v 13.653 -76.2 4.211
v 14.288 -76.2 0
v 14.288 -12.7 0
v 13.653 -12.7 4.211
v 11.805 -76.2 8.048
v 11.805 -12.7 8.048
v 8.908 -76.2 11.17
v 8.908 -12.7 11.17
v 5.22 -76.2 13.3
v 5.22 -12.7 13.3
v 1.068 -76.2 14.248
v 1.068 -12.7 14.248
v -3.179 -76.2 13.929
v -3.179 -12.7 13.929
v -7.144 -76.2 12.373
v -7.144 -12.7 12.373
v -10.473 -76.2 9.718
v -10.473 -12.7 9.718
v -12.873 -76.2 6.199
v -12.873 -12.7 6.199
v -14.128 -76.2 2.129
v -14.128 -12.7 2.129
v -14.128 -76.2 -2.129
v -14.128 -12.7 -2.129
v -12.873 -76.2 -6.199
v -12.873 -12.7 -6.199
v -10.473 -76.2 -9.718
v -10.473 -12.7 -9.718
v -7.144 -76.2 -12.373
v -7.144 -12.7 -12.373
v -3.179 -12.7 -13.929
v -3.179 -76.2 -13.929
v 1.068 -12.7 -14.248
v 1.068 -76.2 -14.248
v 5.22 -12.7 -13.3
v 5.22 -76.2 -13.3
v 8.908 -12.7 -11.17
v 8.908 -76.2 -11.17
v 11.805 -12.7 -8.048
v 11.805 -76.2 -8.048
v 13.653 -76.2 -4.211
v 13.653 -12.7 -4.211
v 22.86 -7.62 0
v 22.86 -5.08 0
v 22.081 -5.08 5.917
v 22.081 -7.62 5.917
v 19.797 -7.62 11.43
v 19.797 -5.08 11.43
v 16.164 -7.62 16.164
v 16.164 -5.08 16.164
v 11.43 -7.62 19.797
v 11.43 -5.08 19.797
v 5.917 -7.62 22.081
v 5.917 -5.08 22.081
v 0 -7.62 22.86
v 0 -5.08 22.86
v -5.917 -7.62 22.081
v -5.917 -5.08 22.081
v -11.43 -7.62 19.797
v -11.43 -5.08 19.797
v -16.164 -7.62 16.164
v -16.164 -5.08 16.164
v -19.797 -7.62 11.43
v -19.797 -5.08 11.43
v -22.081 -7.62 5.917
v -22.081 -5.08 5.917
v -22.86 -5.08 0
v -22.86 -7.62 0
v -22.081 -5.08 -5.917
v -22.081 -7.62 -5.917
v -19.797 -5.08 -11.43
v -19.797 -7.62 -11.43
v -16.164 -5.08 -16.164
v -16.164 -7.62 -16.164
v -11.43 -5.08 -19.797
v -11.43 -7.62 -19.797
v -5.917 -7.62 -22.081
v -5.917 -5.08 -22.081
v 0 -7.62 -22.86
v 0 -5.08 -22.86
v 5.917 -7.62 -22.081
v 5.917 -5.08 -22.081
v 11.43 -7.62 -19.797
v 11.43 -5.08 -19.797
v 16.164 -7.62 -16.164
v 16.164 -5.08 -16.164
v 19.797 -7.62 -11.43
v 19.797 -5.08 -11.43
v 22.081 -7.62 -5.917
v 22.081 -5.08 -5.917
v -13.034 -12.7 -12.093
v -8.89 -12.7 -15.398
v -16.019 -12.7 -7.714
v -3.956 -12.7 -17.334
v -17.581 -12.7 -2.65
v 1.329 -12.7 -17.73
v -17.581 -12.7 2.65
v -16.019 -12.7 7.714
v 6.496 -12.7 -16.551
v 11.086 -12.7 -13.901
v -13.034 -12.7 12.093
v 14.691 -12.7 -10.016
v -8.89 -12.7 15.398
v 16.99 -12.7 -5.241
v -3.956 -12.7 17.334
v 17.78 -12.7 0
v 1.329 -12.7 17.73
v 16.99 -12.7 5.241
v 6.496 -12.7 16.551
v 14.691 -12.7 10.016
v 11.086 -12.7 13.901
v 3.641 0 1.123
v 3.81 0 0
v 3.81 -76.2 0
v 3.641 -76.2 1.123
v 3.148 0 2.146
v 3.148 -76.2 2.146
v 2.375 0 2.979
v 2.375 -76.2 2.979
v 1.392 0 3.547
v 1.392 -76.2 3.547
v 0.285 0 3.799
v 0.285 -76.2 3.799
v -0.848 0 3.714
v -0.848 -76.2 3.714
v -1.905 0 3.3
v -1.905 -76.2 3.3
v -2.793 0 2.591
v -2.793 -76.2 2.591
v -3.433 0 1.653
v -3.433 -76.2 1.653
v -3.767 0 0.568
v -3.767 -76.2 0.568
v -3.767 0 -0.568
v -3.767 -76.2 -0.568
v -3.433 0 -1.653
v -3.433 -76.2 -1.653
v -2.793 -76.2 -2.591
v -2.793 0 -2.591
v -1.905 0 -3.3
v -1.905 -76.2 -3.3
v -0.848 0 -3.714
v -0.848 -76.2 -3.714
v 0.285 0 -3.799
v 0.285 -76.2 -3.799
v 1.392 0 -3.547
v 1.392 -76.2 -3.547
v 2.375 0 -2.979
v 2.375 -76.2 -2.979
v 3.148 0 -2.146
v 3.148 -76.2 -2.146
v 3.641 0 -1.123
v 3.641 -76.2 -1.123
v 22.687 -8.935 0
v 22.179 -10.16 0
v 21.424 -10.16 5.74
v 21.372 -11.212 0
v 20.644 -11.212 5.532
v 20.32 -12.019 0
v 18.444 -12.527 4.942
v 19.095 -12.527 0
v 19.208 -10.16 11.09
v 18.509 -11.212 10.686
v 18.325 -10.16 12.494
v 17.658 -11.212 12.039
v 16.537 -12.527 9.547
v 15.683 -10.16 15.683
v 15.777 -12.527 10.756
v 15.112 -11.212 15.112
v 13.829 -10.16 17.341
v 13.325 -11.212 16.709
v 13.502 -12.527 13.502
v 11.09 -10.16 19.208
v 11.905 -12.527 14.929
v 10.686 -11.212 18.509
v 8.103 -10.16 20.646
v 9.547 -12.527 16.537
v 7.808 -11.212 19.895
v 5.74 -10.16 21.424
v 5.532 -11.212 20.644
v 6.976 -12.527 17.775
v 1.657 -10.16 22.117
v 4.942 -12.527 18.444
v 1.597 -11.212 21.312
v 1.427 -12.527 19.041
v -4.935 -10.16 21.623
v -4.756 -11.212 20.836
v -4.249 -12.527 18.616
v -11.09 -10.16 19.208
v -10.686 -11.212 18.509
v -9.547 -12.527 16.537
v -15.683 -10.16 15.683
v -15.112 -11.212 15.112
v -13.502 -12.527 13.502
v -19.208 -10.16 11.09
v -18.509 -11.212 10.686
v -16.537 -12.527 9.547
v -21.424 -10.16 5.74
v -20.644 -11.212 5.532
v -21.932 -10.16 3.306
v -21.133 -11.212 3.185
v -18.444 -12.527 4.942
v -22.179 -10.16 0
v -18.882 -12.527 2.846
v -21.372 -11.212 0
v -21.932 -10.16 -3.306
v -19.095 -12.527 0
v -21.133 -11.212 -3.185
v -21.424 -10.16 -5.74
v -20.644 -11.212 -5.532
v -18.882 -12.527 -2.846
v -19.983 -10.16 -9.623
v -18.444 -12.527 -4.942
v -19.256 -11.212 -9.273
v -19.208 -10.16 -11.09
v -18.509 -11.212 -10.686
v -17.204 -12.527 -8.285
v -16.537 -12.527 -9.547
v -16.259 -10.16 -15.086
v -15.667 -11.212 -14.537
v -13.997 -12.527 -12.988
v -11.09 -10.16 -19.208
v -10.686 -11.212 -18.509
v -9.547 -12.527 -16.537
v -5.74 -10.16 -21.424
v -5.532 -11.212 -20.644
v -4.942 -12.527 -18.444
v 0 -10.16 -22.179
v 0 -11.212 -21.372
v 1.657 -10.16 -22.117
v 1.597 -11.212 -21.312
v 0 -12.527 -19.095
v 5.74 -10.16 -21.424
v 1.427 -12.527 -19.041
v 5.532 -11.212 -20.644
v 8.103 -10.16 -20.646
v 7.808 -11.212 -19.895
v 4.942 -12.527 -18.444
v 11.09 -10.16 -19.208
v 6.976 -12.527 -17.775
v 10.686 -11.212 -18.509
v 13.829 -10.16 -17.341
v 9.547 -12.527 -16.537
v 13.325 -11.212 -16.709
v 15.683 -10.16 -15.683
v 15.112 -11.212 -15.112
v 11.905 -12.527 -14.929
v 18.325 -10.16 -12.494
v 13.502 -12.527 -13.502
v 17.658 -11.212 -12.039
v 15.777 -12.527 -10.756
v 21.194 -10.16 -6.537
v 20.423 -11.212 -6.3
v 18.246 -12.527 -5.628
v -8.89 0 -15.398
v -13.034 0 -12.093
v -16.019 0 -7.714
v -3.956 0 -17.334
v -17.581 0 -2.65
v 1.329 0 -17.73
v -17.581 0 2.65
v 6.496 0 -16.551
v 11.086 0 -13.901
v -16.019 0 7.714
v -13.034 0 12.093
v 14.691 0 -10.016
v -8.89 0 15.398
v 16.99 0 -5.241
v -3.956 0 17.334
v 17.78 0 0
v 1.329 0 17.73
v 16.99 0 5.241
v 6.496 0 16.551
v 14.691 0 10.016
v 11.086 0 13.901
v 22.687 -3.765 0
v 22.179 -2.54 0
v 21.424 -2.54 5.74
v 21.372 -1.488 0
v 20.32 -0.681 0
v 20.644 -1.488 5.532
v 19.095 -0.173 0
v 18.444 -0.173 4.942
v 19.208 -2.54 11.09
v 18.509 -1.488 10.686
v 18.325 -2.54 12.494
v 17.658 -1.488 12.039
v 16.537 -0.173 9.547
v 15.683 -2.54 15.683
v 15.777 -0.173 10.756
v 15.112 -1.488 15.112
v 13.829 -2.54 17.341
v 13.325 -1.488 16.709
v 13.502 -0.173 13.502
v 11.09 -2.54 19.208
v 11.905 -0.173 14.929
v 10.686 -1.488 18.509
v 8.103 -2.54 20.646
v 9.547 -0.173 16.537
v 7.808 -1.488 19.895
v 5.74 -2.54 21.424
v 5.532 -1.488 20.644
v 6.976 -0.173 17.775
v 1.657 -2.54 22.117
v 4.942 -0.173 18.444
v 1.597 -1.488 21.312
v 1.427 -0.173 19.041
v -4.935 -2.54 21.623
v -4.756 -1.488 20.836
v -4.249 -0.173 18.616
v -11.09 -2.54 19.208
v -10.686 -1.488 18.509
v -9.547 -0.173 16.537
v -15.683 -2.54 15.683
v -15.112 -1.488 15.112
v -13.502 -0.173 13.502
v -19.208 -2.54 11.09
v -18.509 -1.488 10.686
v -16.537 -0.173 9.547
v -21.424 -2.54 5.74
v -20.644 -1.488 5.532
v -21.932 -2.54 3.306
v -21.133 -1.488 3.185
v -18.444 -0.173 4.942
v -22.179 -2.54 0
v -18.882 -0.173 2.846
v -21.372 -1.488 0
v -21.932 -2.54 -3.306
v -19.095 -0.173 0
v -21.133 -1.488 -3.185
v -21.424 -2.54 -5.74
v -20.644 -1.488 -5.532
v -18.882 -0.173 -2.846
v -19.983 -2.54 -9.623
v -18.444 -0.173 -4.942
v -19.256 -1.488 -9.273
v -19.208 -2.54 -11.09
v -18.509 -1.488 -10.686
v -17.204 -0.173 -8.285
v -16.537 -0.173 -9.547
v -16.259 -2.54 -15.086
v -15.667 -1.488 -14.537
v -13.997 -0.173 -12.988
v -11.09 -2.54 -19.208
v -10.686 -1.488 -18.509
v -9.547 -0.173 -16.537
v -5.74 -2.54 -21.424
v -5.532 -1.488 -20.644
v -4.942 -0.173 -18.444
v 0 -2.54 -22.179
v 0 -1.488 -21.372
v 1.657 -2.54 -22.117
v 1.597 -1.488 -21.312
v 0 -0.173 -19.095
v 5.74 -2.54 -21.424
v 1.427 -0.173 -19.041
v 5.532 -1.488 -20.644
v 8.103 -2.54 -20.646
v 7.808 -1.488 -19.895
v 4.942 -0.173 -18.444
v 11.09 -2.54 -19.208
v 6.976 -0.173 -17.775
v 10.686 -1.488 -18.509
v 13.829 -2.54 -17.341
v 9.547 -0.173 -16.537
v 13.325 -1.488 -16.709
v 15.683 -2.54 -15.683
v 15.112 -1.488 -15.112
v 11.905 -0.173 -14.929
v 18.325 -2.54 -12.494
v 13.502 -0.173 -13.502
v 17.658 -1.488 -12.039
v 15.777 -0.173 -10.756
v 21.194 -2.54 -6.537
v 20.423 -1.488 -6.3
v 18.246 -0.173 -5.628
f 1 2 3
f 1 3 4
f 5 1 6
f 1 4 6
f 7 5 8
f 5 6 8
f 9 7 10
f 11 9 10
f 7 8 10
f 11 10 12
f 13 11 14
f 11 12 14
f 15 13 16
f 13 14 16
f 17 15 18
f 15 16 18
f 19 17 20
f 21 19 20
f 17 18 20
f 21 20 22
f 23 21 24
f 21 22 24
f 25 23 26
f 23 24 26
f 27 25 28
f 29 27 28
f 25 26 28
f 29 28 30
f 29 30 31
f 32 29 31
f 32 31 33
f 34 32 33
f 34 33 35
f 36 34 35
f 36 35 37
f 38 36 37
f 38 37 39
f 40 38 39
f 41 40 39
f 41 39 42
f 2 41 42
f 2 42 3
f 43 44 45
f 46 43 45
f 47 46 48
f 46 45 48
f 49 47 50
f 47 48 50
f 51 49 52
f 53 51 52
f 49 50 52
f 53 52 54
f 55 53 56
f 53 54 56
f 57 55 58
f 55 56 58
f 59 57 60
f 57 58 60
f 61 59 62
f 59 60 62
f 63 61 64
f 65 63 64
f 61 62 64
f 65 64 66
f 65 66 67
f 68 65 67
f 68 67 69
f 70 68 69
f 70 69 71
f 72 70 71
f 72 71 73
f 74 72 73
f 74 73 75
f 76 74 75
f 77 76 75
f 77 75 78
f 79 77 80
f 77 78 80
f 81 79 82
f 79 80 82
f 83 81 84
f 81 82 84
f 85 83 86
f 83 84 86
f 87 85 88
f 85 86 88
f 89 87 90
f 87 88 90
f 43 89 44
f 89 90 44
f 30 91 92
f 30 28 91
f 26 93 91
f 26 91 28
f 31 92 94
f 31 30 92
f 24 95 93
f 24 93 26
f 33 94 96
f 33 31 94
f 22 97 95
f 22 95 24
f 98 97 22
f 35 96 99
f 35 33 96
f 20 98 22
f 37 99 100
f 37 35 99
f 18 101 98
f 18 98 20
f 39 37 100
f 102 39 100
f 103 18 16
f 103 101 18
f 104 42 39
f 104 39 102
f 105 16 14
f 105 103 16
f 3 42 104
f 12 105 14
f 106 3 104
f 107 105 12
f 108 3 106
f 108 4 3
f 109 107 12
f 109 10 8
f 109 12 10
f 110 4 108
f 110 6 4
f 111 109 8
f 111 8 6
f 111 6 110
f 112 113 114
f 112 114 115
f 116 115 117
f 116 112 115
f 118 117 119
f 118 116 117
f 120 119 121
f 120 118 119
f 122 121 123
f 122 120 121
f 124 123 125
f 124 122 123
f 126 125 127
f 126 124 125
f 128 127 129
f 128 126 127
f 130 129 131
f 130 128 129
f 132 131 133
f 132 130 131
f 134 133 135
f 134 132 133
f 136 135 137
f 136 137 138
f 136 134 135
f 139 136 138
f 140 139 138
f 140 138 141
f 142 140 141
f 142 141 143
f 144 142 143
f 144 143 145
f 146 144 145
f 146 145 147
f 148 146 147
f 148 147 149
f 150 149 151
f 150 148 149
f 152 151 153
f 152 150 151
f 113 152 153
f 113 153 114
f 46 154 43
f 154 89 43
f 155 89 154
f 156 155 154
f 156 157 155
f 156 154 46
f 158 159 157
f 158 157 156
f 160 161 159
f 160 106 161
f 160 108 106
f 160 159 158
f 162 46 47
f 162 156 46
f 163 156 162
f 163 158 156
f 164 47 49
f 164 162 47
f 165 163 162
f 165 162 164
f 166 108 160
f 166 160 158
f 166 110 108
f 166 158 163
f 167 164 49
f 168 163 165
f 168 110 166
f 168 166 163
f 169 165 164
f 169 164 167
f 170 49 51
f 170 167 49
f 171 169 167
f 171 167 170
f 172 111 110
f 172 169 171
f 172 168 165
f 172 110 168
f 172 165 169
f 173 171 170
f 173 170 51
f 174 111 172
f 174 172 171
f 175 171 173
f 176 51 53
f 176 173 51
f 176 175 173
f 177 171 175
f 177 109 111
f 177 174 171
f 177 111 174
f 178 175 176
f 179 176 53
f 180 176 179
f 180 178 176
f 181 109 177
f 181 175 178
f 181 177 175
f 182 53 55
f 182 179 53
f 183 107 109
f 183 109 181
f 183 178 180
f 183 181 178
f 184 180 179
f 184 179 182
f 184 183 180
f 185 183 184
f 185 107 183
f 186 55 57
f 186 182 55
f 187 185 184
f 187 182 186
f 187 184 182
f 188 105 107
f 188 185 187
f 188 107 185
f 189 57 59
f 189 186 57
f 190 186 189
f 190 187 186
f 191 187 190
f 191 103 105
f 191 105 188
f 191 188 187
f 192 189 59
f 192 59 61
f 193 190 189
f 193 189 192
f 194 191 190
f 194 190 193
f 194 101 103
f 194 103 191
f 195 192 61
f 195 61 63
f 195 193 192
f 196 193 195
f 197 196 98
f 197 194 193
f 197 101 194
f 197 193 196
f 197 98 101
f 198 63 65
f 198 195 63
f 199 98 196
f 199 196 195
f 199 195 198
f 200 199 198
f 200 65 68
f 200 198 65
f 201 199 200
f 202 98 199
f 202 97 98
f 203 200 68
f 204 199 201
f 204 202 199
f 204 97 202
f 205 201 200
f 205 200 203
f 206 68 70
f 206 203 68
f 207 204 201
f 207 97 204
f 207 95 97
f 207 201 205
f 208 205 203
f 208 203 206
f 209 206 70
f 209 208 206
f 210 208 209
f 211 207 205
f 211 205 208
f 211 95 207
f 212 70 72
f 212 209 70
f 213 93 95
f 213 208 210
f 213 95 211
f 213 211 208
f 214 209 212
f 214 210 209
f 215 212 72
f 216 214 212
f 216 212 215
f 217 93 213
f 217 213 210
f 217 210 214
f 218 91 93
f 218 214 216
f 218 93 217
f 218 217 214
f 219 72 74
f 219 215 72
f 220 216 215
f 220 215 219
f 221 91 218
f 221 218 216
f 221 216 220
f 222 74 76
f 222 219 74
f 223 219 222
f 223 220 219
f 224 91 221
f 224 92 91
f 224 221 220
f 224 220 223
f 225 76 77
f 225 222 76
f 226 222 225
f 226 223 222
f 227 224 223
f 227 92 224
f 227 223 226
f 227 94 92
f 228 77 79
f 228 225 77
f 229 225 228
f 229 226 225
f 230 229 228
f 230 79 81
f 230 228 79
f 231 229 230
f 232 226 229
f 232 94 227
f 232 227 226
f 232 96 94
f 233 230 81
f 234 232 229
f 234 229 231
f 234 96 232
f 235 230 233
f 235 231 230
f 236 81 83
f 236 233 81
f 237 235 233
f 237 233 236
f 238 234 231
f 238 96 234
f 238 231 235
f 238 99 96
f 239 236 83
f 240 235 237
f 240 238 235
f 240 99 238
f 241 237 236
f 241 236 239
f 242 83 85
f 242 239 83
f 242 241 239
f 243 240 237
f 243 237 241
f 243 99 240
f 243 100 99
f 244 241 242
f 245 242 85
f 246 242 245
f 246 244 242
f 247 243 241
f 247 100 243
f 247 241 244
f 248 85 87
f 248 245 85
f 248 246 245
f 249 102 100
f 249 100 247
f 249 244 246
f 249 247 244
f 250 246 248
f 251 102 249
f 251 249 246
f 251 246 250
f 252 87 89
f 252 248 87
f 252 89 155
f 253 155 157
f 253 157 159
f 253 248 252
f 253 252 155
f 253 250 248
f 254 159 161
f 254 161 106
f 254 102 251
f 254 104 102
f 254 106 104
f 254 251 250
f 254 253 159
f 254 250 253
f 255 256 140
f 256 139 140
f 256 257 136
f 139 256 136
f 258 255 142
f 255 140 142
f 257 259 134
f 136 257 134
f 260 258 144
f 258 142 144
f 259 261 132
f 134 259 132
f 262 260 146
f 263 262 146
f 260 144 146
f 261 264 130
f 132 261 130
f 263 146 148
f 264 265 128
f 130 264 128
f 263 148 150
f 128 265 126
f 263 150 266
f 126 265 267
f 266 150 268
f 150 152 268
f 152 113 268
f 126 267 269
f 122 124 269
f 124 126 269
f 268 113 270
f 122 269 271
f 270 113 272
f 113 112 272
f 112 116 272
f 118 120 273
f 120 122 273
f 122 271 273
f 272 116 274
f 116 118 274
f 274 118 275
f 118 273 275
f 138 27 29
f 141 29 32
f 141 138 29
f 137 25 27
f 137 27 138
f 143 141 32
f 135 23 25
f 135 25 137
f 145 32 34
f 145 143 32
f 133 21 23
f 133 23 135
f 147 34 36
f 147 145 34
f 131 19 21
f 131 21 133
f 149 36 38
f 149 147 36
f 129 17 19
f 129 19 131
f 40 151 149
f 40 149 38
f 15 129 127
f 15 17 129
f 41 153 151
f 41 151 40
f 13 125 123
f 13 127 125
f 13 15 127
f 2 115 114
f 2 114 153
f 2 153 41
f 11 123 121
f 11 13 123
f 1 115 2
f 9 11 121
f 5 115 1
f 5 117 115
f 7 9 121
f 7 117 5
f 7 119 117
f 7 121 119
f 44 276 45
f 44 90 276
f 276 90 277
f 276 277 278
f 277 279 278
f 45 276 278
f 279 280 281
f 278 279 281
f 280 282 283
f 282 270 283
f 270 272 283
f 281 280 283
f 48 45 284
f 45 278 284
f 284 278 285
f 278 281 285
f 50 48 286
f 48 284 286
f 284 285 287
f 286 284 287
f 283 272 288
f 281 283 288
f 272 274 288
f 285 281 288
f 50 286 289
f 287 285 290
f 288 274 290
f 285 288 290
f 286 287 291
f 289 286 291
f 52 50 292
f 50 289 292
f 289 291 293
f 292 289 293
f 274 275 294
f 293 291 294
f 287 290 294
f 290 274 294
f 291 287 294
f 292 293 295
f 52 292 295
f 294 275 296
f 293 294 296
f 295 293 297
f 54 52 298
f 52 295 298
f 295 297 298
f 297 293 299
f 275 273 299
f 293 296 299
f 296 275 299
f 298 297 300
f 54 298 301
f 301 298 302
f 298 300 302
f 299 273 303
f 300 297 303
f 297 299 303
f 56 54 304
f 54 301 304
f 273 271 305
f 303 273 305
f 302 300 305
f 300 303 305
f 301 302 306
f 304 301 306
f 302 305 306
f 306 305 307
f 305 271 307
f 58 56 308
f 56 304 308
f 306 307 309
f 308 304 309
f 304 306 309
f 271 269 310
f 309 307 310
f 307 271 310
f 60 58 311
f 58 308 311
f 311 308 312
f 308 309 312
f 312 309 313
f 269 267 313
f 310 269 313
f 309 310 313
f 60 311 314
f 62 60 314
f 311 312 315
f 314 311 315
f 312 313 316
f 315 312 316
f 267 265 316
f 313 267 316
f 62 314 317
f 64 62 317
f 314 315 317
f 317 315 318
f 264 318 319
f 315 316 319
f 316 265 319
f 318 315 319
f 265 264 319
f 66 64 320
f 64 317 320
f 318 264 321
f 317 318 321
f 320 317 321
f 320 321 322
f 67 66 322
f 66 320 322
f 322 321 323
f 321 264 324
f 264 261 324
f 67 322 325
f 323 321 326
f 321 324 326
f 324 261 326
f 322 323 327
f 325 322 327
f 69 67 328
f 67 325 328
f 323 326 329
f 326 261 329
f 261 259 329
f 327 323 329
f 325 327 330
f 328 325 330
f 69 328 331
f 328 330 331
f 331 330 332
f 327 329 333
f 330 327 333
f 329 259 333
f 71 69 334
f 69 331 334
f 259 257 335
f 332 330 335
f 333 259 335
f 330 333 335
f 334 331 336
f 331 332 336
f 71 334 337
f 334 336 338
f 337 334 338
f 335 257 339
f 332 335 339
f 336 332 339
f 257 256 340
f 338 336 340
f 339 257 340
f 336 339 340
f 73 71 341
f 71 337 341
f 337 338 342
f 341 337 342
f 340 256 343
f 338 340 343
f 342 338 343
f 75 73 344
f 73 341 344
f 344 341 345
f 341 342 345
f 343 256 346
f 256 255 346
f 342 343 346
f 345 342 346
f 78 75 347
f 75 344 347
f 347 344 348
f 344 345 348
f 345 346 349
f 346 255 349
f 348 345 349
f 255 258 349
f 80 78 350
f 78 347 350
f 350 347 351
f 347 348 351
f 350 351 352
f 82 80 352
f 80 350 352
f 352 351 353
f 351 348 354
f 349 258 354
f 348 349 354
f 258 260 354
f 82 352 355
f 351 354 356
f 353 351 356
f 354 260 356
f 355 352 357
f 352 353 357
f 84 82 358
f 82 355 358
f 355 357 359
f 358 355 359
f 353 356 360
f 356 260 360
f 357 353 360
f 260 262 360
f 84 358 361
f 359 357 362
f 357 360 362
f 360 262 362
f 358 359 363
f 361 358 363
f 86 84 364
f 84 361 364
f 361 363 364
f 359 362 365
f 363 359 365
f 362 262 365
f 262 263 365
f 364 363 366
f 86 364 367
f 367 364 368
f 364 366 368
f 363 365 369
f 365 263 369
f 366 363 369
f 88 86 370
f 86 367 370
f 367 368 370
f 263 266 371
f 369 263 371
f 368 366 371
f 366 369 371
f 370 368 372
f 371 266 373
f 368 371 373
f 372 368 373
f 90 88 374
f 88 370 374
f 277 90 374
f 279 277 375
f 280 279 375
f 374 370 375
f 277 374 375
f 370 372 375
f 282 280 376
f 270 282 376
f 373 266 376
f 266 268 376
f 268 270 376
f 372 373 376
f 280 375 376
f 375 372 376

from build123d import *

# Parameters (mm, degrees)
F0_R     = 22.86
F0_R_2   = 14.2875
F2_DEPTH = 12.7
F3_R     = 5.08
F0_R_3   = 3.81
F5_DEPTH = 76.2


# Not quite as in the source:
# - the program builds the solid bodies; features that only make, move or delete a surface that nothing else refers to are left out


with BuildPart() as f2:
    # F0 (on Front) → F2 (new body)
    with BuildSketch(Plane.XZ):
        Circle(F0_R)
        Circle(F0_R_2, mode=Mode.SUBTRACT)
    extrude(amount=F2_DEPTH)

    # F3
    f3_edges = [f2.edges().sort_by_distance(p)[0] for p in [
        (-22.86, 0, 0),
        (-22.86, -12.7, 0),
    ]]
    fillet(f3_edges, radius=F3_R)

    # F0 (on Front) → F5 (join)
    with BuildSketch(Plane.XZ):
        Circle(F0_R_2)
        Circle(F0_R_3, mode=Mode.SUBTRACT)
    extrude(amount=F5_DEPTH)


solid = f2.part
